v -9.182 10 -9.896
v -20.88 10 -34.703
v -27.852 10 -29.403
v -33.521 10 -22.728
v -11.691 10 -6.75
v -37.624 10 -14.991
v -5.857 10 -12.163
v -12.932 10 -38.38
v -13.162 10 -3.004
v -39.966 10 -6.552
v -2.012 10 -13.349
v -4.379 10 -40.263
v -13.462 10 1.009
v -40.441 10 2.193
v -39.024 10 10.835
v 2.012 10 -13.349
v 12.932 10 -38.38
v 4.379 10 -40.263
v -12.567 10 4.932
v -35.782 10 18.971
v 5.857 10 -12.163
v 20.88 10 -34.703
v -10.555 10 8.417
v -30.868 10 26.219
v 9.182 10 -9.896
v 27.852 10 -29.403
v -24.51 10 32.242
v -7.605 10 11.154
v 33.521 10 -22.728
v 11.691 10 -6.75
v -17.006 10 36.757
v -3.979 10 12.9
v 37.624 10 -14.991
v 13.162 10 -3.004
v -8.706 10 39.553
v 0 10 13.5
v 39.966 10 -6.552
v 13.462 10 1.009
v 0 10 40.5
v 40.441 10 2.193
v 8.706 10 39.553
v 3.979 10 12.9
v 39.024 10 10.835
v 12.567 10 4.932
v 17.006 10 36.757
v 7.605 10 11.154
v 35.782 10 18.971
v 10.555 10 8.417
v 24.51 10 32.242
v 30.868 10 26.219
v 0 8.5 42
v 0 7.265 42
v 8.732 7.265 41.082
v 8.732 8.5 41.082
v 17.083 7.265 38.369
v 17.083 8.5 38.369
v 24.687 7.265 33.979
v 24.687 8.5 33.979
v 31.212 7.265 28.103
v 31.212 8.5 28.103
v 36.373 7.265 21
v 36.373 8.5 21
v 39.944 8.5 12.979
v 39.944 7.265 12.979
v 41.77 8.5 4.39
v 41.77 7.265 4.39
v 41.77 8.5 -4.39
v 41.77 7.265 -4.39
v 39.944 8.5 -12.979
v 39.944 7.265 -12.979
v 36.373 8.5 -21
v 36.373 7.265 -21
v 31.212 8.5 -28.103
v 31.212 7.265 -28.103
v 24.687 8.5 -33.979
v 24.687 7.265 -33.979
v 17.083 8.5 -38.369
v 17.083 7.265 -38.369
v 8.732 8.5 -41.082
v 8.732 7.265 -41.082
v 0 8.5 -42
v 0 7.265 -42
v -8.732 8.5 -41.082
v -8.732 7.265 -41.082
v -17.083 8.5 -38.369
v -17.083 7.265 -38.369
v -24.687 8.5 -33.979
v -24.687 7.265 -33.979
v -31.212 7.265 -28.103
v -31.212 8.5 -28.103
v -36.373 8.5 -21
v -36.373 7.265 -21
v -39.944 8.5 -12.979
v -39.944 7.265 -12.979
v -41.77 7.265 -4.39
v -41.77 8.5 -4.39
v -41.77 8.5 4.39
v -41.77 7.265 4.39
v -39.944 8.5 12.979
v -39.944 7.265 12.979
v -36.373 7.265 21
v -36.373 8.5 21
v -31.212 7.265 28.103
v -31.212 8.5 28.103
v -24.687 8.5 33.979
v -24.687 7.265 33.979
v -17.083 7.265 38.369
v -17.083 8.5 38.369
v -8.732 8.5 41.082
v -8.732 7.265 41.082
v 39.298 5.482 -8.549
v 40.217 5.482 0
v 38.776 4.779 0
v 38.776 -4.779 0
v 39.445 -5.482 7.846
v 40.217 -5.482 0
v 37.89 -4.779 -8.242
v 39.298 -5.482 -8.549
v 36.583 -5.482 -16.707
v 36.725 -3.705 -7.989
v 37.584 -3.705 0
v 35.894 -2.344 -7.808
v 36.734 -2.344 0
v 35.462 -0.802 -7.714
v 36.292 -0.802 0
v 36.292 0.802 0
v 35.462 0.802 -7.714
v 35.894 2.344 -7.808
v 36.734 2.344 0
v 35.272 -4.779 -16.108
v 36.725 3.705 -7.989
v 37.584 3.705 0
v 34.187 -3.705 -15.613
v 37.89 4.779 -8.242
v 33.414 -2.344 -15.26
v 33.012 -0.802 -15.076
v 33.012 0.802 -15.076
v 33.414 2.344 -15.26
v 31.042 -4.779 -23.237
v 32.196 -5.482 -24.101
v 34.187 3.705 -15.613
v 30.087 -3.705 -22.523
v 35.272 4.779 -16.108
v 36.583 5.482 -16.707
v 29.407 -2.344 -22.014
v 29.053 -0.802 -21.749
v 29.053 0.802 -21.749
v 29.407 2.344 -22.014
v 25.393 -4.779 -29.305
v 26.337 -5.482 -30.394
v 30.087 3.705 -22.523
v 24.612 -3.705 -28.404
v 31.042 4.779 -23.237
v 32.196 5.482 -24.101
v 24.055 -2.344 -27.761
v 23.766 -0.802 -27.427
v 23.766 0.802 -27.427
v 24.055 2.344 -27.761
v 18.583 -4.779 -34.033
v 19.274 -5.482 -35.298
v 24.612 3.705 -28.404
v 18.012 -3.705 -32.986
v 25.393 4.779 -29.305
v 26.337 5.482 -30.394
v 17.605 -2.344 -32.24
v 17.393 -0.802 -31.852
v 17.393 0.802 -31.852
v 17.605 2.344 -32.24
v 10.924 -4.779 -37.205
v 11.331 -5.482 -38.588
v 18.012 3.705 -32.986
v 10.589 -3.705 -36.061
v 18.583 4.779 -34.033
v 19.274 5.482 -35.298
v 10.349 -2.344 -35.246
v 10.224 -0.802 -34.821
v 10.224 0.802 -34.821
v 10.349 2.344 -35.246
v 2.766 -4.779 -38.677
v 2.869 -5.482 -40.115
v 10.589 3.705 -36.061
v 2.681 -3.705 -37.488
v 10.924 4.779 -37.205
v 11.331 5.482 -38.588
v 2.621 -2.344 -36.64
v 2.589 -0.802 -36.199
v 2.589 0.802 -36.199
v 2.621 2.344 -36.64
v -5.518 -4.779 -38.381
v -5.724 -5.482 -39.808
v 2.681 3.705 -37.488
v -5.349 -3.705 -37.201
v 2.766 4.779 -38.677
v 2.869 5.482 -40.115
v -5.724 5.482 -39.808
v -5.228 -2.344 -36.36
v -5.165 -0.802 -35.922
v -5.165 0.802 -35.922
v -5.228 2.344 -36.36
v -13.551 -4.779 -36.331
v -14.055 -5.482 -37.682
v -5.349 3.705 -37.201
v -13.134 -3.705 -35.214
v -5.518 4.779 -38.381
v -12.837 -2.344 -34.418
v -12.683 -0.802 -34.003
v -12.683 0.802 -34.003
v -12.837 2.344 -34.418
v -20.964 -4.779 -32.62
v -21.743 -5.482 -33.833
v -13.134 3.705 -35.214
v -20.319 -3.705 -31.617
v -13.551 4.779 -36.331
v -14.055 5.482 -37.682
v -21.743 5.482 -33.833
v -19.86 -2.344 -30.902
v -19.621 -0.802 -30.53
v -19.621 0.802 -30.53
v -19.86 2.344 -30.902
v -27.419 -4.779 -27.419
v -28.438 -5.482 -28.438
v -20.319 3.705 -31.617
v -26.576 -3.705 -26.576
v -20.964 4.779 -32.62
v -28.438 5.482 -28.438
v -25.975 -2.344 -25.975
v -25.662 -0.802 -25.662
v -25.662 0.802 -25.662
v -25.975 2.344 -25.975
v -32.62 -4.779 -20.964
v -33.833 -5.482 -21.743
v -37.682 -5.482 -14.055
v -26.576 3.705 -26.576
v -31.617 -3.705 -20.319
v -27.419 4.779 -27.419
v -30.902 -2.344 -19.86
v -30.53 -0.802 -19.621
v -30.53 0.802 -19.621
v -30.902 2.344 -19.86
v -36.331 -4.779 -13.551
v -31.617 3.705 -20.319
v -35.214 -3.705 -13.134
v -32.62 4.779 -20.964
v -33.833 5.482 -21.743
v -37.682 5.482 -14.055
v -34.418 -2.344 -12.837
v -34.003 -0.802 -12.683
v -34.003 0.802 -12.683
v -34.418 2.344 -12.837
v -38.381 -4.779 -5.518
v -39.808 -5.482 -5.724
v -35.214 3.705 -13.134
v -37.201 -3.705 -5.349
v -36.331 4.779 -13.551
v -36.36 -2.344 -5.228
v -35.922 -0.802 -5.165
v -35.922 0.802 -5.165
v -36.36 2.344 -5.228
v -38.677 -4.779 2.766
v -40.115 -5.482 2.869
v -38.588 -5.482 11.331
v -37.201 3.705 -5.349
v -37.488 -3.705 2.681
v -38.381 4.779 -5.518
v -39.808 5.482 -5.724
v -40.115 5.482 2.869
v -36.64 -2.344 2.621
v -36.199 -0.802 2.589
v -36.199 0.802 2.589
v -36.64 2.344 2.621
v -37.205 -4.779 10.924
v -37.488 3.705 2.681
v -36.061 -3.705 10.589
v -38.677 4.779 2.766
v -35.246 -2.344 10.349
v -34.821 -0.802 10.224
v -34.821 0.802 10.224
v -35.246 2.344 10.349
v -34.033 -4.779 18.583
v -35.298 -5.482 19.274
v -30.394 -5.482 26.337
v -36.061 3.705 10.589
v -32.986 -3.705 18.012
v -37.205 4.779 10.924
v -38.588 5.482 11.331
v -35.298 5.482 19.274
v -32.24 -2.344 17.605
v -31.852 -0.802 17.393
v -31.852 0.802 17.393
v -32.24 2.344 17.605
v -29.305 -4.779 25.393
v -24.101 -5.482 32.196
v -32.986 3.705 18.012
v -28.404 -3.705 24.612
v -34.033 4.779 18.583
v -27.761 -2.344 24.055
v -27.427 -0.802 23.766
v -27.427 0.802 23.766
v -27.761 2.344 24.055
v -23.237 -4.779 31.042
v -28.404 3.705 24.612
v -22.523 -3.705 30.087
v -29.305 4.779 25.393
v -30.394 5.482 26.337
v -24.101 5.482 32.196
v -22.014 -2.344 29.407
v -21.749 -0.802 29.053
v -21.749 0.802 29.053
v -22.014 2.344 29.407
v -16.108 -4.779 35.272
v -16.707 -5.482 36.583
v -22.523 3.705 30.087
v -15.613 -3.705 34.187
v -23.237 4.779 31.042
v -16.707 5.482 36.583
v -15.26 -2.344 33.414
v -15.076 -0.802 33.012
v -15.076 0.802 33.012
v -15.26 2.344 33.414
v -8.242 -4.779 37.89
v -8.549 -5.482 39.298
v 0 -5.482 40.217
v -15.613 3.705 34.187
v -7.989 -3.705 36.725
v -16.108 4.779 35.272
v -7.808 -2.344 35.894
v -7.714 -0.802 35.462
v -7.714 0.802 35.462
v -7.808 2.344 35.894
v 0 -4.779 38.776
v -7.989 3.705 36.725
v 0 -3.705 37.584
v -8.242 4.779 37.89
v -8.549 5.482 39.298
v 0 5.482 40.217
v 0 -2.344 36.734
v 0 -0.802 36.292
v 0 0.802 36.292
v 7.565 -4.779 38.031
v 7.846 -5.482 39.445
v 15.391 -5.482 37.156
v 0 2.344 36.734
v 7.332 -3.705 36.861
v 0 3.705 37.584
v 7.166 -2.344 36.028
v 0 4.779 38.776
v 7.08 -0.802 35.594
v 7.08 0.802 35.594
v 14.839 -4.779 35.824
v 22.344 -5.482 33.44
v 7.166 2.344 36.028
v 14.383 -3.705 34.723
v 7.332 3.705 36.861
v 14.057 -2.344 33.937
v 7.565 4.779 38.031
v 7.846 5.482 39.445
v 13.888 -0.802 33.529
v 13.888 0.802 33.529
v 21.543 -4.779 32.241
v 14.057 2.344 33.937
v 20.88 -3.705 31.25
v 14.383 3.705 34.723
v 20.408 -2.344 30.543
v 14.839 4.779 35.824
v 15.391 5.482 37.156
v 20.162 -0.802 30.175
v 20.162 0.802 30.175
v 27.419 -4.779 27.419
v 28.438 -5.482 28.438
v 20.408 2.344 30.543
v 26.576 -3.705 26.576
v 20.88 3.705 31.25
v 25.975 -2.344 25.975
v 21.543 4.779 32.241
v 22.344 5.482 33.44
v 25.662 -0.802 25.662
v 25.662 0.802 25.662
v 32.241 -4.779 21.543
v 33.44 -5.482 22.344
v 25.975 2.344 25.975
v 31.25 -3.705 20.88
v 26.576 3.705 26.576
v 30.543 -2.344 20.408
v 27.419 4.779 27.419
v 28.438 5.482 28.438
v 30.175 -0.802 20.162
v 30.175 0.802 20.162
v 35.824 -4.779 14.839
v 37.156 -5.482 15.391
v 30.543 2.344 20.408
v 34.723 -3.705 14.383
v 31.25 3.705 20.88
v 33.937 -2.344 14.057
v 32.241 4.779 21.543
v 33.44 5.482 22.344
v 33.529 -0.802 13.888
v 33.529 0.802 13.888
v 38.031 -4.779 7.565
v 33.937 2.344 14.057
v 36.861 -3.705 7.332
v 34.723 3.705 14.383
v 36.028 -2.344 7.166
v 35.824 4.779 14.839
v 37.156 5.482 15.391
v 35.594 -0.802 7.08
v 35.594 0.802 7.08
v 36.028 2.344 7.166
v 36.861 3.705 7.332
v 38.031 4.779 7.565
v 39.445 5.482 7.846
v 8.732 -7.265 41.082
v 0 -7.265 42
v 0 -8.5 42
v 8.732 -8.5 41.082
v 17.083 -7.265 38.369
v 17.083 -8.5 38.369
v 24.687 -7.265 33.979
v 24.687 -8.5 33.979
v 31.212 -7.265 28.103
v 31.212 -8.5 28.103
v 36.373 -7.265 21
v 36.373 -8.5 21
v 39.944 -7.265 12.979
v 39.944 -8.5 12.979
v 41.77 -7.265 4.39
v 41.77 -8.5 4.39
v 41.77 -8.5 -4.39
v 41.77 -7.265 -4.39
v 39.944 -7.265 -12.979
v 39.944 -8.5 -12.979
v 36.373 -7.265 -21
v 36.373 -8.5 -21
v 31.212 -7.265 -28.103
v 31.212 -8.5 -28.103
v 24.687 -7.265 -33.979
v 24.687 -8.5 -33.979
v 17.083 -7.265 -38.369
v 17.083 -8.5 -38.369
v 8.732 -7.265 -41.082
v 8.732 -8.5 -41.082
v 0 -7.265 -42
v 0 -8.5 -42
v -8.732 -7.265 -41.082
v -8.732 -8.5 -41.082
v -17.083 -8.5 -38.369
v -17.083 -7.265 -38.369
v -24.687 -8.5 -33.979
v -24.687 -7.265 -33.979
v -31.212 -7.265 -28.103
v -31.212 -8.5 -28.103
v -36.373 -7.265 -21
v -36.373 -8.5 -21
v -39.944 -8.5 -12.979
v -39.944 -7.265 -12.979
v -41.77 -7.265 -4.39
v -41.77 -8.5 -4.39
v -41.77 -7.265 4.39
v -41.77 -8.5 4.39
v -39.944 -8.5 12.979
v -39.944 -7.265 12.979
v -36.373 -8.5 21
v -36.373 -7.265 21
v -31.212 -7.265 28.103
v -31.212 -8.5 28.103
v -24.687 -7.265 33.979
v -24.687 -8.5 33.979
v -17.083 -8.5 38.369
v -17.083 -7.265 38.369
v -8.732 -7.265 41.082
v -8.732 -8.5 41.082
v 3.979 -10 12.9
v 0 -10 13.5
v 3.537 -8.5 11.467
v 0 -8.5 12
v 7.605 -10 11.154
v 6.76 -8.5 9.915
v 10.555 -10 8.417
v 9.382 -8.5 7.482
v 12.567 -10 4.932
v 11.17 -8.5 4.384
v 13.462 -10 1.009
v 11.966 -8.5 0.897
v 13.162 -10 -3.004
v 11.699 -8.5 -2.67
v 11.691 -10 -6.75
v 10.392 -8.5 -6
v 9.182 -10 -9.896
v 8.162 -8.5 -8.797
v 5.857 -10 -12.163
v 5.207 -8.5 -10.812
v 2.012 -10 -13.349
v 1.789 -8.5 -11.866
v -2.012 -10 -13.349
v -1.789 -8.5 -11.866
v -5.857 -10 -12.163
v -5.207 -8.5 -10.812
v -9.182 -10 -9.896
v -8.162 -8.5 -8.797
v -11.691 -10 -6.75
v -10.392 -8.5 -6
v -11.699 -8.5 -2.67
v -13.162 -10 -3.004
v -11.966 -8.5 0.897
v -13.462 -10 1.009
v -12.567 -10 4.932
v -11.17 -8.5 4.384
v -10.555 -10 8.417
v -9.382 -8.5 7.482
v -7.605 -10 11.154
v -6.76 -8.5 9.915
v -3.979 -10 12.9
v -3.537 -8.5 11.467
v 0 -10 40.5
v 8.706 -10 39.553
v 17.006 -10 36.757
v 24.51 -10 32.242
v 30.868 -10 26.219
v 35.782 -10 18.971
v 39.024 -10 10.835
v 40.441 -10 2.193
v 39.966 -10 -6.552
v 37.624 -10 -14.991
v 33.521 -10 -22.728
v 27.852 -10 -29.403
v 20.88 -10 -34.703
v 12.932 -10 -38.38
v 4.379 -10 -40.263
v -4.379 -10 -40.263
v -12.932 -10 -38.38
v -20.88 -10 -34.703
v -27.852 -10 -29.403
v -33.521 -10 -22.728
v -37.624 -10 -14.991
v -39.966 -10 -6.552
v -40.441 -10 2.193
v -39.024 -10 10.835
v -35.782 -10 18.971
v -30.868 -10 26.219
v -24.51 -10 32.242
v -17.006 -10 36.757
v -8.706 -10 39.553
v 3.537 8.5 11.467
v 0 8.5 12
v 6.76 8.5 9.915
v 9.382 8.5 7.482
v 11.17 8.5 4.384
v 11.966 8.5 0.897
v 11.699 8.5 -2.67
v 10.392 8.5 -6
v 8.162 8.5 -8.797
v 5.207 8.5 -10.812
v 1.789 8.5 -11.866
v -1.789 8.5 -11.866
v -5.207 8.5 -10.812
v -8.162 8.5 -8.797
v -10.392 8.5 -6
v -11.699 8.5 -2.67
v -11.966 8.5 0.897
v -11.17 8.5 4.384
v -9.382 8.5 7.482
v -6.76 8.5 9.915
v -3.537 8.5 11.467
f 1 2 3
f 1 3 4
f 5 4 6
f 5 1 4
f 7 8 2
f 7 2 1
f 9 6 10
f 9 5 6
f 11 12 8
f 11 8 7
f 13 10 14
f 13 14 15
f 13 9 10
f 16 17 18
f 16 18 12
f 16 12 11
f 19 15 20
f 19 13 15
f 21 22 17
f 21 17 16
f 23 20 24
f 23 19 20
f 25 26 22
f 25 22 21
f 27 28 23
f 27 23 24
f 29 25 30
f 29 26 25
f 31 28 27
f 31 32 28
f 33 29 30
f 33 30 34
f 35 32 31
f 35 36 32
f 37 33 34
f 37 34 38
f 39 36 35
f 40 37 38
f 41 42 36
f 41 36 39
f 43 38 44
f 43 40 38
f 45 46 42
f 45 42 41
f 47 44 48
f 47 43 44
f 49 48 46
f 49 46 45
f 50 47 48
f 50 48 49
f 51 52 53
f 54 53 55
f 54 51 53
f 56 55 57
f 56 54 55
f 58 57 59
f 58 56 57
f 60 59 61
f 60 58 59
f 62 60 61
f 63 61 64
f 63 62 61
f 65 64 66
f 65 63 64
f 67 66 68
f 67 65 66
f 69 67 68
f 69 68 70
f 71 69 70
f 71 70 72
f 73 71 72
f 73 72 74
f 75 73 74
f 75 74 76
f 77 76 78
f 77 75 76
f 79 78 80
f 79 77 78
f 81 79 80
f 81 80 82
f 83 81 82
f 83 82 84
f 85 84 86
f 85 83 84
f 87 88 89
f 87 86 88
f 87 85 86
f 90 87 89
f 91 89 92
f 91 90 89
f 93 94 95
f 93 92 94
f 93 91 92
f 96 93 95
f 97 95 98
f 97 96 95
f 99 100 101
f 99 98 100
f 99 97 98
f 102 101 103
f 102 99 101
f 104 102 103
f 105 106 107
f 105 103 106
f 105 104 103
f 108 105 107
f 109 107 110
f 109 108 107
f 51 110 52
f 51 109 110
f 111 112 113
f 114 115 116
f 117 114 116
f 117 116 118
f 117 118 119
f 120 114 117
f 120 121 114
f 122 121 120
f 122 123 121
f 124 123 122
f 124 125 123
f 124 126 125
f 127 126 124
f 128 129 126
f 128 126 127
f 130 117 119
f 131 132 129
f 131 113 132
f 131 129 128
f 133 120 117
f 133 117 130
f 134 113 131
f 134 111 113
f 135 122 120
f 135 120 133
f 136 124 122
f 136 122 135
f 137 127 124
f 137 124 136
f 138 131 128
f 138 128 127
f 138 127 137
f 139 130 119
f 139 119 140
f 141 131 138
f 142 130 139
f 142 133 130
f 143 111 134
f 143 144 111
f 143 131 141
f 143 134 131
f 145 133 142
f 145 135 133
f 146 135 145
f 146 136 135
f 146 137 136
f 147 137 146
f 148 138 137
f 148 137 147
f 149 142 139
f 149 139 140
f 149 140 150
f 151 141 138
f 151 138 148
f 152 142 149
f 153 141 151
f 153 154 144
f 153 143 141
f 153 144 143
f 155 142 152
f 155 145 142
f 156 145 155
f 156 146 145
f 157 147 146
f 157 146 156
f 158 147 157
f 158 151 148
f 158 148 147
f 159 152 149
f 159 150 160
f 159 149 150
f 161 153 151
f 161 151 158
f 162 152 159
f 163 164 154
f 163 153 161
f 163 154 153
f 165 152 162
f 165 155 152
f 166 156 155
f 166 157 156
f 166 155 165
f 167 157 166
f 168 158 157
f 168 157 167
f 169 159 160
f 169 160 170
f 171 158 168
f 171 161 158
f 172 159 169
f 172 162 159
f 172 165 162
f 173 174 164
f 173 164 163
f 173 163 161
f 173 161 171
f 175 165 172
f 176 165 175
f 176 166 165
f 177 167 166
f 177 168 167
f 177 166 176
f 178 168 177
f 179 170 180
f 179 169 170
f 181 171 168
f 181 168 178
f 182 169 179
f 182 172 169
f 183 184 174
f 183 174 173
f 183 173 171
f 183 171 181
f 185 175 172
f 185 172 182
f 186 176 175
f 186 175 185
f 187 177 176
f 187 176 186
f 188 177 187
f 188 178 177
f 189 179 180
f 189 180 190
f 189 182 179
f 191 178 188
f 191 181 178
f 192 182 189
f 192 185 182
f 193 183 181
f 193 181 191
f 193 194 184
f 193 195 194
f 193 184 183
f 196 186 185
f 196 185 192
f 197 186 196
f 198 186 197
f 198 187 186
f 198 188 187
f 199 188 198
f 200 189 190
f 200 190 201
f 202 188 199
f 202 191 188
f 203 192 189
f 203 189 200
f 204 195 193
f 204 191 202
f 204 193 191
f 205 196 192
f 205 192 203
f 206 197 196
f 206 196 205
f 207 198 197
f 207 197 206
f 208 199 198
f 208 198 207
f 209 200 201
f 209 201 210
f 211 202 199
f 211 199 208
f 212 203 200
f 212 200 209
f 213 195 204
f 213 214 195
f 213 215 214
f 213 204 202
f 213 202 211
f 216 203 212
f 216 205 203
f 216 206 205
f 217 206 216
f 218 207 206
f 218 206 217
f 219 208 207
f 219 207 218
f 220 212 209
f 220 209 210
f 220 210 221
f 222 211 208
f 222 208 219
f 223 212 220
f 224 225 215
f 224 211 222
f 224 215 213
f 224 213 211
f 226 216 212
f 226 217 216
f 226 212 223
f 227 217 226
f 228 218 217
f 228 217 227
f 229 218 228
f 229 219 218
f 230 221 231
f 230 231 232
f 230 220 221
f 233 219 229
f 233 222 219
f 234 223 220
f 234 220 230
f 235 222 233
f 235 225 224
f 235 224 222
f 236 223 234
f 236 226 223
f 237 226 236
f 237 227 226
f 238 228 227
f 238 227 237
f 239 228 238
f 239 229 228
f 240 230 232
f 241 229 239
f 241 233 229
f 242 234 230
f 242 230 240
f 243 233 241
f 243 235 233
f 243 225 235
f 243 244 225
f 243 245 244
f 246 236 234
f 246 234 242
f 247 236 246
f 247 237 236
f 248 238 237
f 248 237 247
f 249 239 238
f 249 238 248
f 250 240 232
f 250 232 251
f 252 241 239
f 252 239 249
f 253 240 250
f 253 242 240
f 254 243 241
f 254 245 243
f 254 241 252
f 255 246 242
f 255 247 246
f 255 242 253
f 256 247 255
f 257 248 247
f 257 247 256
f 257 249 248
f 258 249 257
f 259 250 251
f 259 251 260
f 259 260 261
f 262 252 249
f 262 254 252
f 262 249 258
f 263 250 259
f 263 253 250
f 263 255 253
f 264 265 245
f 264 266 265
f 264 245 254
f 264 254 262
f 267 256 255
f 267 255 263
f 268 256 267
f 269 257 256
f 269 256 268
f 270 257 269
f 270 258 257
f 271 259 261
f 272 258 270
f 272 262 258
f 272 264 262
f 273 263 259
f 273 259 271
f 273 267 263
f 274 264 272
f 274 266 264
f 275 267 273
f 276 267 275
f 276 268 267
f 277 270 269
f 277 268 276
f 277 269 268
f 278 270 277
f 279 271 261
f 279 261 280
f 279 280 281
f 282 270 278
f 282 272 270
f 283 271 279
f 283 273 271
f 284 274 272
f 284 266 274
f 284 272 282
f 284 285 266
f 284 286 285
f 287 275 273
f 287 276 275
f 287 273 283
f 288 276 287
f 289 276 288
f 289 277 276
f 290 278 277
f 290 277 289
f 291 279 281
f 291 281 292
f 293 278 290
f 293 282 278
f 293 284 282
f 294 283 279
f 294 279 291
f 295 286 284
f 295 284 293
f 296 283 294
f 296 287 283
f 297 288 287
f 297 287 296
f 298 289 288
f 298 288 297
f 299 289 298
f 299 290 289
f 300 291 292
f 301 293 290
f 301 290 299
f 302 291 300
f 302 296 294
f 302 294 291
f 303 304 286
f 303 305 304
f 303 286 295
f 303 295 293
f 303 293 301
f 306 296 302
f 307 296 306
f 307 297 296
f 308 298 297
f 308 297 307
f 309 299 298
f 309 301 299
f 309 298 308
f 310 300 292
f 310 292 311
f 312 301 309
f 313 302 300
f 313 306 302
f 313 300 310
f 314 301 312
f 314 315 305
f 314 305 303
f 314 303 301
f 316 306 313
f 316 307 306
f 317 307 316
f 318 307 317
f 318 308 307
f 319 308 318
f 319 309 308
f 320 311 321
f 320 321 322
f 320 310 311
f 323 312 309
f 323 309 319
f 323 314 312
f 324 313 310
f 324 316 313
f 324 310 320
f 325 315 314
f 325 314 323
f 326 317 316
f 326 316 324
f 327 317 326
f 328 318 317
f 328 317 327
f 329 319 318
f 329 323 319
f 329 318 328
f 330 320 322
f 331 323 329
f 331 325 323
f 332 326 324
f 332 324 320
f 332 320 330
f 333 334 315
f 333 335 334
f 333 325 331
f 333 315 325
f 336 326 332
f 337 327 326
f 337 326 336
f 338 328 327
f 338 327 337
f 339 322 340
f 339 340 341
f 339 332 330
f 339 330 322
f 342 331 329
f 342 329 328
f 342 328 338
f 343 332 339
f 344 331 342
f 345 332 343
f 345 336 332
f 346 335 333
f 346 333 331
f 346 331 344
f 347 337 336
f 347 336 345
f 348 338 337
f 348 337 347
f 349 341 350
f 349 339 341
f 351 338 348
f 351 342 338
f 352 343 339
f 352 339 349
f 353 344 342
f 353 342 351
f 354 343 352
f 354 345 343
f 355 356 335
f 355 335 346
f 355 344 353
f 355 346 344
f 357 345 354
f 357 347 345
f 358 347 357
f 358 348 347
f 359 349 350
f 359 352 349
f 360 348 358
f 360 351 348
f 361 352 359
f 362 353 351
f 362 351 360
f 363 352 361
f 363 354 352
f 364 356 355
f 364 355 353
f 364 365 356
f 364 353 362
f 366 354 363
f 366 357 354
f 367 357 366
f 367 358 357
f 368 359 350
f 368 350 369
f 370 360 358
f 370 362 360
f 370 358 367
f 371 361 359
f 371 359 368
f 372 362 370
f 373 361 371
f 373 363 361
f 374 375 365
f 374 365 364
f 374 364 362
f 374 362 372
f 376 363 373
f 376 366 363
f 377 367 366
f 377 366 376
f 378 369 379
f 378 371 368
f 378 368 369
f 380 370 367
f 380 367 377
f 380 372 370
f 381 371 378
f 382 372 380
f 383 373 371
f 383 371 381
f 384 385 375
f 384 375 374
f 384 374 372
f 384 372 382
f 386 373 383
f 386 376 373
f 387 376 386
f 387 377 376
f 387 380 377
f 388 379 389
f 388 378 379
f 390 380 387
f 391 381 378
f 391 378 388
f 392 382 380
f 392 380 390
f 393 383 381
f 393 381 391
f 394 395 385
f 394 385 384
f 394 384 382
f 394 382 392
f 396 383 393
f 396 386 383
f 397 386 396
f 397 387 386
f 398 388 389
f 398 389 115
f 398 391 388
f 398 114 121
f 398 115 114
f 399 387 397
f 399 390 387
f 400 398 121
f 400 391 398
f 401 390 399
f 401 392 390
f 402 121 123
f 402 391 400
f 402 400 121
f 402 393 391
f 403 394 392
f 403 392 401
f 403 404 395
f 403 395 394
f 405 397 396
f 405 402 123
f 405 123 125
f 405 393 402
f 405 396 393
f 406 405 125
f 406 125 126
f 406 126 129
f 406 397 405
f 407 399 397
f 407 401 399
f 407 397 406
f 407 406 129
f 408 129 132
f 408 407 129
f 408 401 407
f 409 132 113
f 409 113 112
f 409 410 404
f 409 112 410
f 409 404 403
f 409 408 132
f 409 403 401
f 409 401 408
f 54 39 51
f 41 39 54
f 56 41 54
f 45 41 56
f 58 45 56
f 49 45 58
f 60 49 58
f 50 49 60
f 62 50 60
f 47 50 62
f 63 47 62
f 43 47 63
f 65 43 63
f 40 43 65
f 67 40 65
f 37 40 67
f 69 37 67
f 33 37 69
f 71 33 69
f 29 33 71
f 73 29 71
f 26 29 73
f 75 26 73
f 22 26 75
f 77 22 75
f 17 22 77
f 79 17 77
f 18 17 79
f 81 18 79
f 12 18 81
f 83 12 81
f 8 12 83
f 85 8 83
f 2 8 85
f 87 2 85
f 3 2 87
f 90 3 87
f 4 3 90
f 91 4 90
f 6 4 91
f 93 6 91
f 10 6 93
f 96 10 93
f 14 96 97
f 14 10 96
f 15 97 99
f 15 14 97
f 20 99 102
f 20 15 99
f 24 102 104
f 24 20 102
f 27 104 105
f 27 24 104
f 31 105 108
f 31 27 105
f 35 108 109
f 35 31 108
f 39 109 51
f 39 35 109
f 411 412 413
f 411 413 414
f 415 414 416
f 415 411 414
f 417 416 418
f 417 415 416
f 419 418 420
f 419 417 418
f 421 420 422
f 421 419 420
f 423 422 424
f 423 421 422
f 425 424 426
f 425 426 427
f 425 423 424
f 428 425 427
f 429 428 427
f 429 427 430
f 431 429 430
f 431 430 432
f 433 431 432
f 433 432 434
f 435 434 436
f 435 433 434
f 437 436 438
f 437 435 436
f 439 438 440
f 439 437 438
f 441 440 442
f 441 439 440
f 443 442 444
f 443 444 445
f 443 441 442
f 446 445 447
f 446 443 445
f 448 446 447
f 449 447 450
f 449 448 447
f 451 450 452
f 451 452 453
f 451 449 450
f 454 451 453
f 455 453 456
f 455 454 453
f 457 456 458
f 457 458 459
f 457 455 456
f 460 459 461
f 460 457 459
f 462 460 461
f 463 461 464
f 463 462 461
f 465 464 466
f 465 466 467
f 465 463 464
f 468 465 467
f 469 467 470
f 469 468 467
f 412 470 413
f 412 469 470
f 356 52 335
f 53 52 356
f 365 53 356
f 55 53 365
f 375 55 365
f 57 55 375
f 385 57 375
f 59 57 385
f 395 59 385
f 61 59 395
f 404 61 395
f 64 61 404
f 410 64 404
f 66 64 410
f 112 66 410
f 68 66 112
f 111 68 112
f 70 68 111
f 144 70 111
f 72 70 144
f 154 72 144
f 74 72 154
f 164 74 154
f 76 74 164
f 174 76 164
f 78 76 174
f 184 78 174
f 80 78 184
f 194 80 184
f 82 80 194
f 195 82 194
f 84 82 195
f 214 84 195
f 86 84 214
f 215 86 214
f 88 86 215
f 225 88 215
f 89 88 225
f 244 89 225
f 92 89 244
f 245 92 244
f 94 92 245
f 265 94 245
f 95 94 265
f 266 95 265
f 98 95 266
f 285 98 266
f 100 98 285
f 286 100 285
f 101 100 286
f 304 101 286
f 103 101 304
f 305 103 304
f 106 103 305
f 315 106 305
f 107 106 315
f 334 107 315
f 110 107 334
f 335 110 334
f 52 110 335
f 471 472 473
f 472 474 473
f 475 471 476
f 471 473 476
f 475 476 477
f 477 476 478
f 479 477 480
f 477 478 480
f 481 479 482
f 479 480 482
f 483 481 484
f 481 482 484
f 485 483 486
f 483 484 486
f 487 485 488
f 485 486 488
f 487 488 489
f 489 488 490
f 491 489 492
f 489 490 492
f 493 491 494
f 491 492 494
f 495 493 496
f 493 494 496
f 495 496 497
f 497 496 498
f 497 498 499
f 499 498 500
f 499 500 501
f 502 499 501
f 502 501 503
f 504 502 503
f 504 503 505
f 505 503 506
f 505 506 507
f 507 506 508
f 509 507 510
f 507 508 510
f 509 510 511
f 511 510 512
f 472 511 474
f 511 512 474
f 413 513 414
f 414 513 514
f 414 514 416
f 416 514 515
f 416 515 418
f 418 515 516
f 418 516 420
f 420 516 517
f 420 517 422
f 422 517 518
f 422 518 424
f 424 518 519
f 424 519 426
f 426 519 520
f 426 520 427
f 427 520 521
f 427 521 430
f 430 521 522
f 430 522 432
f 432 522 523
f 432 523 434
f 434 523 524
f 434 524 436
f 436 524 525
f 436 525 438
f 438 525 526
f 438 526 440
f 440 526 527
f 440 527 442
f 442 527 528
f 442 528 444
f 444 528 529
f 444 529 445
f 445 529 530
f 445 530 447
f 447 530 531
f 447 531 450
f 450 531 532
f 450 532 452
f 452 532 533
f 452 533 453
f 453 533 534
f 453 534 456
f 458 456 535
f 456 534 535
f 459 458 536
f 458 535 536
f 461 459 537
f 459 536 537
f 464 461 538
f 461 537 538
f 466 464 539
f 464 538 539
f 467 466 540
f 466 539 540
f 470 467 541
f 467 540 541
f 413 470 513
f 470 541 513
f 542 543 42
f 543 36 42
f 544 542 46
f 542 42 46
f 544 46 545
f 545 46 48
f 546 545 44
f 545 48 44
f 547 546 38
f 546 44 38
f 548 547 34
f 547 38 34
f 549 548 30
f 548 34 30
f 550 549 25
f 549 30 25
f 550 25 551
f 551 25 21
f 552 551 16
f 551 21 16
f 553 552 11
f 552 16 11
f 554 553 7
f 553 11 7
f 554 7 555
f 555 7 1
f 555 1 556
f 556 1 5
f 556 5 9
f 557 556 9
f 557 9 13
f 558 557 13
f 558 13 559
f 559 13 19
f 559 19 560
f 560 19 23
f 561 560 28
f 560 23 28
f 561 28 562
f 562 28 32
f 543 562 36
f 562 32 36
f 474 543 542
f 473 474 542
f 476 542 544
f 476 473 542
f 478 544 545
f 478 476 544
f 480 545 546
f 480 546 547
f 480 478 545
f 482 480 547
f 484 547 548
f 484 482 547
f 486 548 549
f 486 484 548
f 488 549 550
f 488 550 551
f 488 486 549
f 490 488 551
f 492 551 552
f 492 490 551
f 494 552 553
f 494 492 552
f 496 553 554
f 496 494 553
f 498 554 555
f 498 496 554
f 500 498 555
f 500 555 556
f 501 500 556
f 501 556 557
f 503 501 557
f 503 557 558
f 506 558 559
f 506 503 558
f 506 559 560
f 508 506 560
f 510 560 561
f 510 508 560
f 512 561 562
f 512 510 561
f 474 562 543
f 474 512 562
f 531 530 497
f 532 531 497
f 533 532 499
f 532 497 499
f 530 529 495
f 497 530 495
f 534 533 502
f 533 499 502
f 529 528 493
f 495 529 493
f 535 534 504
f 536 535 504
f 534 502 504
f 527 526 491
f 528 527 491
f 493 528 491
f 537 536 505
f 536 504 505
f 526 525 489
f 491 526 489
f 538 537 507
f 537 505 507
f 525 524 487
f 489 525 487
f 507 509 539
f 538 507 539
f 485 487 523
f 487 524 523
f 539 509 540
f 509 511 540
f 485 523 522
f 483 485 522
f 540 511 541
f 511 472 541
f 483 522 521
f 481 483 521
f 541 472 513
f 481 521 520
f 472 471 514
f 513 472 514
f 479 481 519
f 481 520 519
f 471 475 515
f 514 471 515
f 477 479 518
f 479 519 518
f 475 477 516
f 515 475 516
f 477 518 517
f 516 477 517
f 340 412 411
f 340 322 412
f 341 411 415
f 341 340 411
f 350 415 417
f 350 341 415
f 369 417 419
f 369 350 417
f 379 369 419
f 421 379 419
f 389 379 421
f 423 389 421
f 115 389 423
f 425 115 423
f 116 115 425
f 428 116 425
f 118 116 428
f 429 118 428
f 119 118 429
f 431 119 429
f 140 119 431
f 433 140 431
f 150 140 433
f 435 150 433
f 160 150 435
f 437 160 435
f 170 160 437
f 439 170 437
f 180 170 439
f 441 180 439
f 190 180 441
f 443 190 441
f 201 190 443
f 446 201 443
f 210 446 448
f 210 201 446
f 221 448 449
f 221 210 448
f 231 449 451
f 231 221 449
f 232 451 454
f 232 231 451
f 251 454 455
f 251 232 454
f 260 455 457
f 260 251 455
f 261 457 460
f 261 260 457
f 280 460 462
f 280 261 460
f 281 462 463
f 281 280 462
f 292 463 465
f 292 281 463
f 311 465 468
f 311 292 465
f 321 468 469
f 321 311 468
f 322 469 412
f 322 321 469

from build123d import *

# Parameters (mm, degrees)
SKETCH1_R           = 42
SKETCH1_R_2         = 12
BOSS_EXTRUDE1_DEPTH = 10
CHAMFER1_SIZE       = 1.5


with BuildPart() as part:
    # Sketch1 → Boss-Extrude1 (new, symmetric)
    with BuildSketch(Plane(origin=(0, 0, 0), x_dir=(1, 0, 0), z_dir=(0, 1, 0))):
        with Locations(Location((0, 0, 0), (0, 0, 270))):
            Circle(SKETCH1_R)
        with Locations(Location((0, 0, 0), (0, 0, 270))):
            Circle(SKETCH1_R_2, mode=Mode.SUBTRACT)
    extrude(amount=BOSS_EXTRUDE1_DEPTH, both=True)

    # Sketch6 → Cut-Revolve11 (revolve, cut)
    with BuildSketch(Plane.XY, mode=Mode.PRIVATE) as cut_revolve11_sk:
        with BuildLine():
            Line((-42, 5.764577254), (-42, -5.764577254))
            ThreePointArc((-42, -5.764577254), (-36.235422746, 0), (-42, 5.764577254))
        make_face()
    revolve(cut_revolve11_sk.sketch.rotate(Axis((0, 0, 0), (0, 1, 0)), 180), axis=Axis((0, 0, 0), (0, 1, 0)), mode=Mode.SUBTRACT)

    # Chamfer1
    # the kernel refuses this chamfer: 1.5 mm, written as the material it takes off along each edge
    with BuildSketch(Plane(origin=(0, -5.764577254, 0), x_dir=(0, 0, 1), z_dir=(-1, 0, 0))) as chamfer1_piece_1:
        with BuildLine():
            Line((42, -CHAMFER1_SIZE), (40.217482923, 0.282517077))
            ThreePointArc((40.217482923, 0.282517077), (41.073277318, 0.074978324), (42, 0))
            Line((42, 0), (42, -CHAMFER1_SIZE))
        make_face()
    revolve(axis=Axis((0, -5.764577254, 0), (0, 1, 0)), revolution_arc=90, mode=Mode.SUBTRACT)
    with BuildSketch(Plane(origin=(0, 5.764577254, 0), x_dir=(1, 0, 0), z_dir=(0, 0, 1))) as chamfer1_piece_2:
        with BuildLine():
            Line((40.217482923, -0.282517077), (42, CHAMFER1_SIZE))
            Line((42, CHAMFER1_SIZE), (42, 0))
            ThreePointArc((42, 0), (41.073277318, -0.074978324), (40.217482923, -0.282517077))
        make_face()
    revolve(axis=Axis((0, 5.764577254, 0), (0, 1, 0)), revolution_arc=270, mode=Mode.SUBTRACT)
    with BuildSketch(Plane(origin=(0, -10, 0), x_dir=(0, 0, 1), z_dir=(-1, 0, 0))) as chamfer1_piece_3:
        Polygon((42, CHAMFER1_SIZE), (42 - CHAMFER1_SIZE, 0), (42, 0), align=None)
    revolve(axis=Axis((0, -10, 0), (0, 1, 0)), mode=Mode.SUBTRACT)
    with BuildSketch(Plane(origin=(0, 10, 0), x_dir=(0, 0, 1), z_dir=(-1, 0, 0))) as chamfer1_piece_4:
        Polygon((42, -CHAMFER1_SIZE), (42 - CHAMFER1_SIZE, 0), (42, 0), align=None)
    revolve(axis=Axis((0, 10, 0), (0, 1, 0)), mode=Mode.SUBTRACT)
    with BuildSketch(Plane(origin=(0, -10, 0), x_dir=(0, 0, 1), z_dir=(-1, 0, 0))) as chamfer1_piece_5:
        Polygon((12 + CHAMFER1_SIZE, 0), (12, CHAMFER1_SIZE), (12, 0), align=None)
    revolve(axis=Axis((0, -10, 0), (0, 1, 0)), mode=Mode.SUBTRACT)
    with BuildSketch(Plane(origin=(0, 10, 0), x_dir=(0, 0, 1), z_dir=(-1, 0, 0))) as chamfer1_piece_6:
        Polygon((12, -CHAMFER1_SIZE), (12 + CHAMFER1_SIZE, 0), (12, 0), align=None)
    revolve(axis=Axis((0, 10, 0), (0, 1, 0)), mode=Mode.SUBTRACT)
    with BuildSketch(Plane(origin=(0, 5.764577254, 0), x_dir=(0, 0, 1), z_dir=(-1, 0, 0))) as chamfer1_piece_7:
        with BuildLine():
            Line((40.217482923, -0.282517077), (42, CHAMFER1_SIZE))
            Line((42, CHAMFER1_SIZE), (42, 0))
            ThreePointArc((42, 0), (41.073277318, -0.074978324), (40.217482923, -0.282517077))
        make_face()
    revolve(axis=Axis((0, 5.764577254, 0), (0, 1, 0)), revolution_arc=90, mode=Mode.SUBTRACT)
    with BuildSketch(Plane(origin=(0, -5.764577254, 0), x_dir=(1, 0, 0), z_dir=(0, 0, 1))) as chamfer1_piece_8:
        with BuildLine():
            Line((42, -CHAMFER1_SIZE), (40.217482923, 0.282517077))
            ThreePointArc((40.217482923, 0.282517077), (41.073277318, 0.074978324), (42, 0))
            Line((42, 0), (42, -CHAMFER1_SIZE))
        make_face()
    revolve(axis=Axis((0, -5.764577254, 0), (0, 1, 0)), revolution_arc=270, mode=Mode.SUBTRACT)


solid = part.part
